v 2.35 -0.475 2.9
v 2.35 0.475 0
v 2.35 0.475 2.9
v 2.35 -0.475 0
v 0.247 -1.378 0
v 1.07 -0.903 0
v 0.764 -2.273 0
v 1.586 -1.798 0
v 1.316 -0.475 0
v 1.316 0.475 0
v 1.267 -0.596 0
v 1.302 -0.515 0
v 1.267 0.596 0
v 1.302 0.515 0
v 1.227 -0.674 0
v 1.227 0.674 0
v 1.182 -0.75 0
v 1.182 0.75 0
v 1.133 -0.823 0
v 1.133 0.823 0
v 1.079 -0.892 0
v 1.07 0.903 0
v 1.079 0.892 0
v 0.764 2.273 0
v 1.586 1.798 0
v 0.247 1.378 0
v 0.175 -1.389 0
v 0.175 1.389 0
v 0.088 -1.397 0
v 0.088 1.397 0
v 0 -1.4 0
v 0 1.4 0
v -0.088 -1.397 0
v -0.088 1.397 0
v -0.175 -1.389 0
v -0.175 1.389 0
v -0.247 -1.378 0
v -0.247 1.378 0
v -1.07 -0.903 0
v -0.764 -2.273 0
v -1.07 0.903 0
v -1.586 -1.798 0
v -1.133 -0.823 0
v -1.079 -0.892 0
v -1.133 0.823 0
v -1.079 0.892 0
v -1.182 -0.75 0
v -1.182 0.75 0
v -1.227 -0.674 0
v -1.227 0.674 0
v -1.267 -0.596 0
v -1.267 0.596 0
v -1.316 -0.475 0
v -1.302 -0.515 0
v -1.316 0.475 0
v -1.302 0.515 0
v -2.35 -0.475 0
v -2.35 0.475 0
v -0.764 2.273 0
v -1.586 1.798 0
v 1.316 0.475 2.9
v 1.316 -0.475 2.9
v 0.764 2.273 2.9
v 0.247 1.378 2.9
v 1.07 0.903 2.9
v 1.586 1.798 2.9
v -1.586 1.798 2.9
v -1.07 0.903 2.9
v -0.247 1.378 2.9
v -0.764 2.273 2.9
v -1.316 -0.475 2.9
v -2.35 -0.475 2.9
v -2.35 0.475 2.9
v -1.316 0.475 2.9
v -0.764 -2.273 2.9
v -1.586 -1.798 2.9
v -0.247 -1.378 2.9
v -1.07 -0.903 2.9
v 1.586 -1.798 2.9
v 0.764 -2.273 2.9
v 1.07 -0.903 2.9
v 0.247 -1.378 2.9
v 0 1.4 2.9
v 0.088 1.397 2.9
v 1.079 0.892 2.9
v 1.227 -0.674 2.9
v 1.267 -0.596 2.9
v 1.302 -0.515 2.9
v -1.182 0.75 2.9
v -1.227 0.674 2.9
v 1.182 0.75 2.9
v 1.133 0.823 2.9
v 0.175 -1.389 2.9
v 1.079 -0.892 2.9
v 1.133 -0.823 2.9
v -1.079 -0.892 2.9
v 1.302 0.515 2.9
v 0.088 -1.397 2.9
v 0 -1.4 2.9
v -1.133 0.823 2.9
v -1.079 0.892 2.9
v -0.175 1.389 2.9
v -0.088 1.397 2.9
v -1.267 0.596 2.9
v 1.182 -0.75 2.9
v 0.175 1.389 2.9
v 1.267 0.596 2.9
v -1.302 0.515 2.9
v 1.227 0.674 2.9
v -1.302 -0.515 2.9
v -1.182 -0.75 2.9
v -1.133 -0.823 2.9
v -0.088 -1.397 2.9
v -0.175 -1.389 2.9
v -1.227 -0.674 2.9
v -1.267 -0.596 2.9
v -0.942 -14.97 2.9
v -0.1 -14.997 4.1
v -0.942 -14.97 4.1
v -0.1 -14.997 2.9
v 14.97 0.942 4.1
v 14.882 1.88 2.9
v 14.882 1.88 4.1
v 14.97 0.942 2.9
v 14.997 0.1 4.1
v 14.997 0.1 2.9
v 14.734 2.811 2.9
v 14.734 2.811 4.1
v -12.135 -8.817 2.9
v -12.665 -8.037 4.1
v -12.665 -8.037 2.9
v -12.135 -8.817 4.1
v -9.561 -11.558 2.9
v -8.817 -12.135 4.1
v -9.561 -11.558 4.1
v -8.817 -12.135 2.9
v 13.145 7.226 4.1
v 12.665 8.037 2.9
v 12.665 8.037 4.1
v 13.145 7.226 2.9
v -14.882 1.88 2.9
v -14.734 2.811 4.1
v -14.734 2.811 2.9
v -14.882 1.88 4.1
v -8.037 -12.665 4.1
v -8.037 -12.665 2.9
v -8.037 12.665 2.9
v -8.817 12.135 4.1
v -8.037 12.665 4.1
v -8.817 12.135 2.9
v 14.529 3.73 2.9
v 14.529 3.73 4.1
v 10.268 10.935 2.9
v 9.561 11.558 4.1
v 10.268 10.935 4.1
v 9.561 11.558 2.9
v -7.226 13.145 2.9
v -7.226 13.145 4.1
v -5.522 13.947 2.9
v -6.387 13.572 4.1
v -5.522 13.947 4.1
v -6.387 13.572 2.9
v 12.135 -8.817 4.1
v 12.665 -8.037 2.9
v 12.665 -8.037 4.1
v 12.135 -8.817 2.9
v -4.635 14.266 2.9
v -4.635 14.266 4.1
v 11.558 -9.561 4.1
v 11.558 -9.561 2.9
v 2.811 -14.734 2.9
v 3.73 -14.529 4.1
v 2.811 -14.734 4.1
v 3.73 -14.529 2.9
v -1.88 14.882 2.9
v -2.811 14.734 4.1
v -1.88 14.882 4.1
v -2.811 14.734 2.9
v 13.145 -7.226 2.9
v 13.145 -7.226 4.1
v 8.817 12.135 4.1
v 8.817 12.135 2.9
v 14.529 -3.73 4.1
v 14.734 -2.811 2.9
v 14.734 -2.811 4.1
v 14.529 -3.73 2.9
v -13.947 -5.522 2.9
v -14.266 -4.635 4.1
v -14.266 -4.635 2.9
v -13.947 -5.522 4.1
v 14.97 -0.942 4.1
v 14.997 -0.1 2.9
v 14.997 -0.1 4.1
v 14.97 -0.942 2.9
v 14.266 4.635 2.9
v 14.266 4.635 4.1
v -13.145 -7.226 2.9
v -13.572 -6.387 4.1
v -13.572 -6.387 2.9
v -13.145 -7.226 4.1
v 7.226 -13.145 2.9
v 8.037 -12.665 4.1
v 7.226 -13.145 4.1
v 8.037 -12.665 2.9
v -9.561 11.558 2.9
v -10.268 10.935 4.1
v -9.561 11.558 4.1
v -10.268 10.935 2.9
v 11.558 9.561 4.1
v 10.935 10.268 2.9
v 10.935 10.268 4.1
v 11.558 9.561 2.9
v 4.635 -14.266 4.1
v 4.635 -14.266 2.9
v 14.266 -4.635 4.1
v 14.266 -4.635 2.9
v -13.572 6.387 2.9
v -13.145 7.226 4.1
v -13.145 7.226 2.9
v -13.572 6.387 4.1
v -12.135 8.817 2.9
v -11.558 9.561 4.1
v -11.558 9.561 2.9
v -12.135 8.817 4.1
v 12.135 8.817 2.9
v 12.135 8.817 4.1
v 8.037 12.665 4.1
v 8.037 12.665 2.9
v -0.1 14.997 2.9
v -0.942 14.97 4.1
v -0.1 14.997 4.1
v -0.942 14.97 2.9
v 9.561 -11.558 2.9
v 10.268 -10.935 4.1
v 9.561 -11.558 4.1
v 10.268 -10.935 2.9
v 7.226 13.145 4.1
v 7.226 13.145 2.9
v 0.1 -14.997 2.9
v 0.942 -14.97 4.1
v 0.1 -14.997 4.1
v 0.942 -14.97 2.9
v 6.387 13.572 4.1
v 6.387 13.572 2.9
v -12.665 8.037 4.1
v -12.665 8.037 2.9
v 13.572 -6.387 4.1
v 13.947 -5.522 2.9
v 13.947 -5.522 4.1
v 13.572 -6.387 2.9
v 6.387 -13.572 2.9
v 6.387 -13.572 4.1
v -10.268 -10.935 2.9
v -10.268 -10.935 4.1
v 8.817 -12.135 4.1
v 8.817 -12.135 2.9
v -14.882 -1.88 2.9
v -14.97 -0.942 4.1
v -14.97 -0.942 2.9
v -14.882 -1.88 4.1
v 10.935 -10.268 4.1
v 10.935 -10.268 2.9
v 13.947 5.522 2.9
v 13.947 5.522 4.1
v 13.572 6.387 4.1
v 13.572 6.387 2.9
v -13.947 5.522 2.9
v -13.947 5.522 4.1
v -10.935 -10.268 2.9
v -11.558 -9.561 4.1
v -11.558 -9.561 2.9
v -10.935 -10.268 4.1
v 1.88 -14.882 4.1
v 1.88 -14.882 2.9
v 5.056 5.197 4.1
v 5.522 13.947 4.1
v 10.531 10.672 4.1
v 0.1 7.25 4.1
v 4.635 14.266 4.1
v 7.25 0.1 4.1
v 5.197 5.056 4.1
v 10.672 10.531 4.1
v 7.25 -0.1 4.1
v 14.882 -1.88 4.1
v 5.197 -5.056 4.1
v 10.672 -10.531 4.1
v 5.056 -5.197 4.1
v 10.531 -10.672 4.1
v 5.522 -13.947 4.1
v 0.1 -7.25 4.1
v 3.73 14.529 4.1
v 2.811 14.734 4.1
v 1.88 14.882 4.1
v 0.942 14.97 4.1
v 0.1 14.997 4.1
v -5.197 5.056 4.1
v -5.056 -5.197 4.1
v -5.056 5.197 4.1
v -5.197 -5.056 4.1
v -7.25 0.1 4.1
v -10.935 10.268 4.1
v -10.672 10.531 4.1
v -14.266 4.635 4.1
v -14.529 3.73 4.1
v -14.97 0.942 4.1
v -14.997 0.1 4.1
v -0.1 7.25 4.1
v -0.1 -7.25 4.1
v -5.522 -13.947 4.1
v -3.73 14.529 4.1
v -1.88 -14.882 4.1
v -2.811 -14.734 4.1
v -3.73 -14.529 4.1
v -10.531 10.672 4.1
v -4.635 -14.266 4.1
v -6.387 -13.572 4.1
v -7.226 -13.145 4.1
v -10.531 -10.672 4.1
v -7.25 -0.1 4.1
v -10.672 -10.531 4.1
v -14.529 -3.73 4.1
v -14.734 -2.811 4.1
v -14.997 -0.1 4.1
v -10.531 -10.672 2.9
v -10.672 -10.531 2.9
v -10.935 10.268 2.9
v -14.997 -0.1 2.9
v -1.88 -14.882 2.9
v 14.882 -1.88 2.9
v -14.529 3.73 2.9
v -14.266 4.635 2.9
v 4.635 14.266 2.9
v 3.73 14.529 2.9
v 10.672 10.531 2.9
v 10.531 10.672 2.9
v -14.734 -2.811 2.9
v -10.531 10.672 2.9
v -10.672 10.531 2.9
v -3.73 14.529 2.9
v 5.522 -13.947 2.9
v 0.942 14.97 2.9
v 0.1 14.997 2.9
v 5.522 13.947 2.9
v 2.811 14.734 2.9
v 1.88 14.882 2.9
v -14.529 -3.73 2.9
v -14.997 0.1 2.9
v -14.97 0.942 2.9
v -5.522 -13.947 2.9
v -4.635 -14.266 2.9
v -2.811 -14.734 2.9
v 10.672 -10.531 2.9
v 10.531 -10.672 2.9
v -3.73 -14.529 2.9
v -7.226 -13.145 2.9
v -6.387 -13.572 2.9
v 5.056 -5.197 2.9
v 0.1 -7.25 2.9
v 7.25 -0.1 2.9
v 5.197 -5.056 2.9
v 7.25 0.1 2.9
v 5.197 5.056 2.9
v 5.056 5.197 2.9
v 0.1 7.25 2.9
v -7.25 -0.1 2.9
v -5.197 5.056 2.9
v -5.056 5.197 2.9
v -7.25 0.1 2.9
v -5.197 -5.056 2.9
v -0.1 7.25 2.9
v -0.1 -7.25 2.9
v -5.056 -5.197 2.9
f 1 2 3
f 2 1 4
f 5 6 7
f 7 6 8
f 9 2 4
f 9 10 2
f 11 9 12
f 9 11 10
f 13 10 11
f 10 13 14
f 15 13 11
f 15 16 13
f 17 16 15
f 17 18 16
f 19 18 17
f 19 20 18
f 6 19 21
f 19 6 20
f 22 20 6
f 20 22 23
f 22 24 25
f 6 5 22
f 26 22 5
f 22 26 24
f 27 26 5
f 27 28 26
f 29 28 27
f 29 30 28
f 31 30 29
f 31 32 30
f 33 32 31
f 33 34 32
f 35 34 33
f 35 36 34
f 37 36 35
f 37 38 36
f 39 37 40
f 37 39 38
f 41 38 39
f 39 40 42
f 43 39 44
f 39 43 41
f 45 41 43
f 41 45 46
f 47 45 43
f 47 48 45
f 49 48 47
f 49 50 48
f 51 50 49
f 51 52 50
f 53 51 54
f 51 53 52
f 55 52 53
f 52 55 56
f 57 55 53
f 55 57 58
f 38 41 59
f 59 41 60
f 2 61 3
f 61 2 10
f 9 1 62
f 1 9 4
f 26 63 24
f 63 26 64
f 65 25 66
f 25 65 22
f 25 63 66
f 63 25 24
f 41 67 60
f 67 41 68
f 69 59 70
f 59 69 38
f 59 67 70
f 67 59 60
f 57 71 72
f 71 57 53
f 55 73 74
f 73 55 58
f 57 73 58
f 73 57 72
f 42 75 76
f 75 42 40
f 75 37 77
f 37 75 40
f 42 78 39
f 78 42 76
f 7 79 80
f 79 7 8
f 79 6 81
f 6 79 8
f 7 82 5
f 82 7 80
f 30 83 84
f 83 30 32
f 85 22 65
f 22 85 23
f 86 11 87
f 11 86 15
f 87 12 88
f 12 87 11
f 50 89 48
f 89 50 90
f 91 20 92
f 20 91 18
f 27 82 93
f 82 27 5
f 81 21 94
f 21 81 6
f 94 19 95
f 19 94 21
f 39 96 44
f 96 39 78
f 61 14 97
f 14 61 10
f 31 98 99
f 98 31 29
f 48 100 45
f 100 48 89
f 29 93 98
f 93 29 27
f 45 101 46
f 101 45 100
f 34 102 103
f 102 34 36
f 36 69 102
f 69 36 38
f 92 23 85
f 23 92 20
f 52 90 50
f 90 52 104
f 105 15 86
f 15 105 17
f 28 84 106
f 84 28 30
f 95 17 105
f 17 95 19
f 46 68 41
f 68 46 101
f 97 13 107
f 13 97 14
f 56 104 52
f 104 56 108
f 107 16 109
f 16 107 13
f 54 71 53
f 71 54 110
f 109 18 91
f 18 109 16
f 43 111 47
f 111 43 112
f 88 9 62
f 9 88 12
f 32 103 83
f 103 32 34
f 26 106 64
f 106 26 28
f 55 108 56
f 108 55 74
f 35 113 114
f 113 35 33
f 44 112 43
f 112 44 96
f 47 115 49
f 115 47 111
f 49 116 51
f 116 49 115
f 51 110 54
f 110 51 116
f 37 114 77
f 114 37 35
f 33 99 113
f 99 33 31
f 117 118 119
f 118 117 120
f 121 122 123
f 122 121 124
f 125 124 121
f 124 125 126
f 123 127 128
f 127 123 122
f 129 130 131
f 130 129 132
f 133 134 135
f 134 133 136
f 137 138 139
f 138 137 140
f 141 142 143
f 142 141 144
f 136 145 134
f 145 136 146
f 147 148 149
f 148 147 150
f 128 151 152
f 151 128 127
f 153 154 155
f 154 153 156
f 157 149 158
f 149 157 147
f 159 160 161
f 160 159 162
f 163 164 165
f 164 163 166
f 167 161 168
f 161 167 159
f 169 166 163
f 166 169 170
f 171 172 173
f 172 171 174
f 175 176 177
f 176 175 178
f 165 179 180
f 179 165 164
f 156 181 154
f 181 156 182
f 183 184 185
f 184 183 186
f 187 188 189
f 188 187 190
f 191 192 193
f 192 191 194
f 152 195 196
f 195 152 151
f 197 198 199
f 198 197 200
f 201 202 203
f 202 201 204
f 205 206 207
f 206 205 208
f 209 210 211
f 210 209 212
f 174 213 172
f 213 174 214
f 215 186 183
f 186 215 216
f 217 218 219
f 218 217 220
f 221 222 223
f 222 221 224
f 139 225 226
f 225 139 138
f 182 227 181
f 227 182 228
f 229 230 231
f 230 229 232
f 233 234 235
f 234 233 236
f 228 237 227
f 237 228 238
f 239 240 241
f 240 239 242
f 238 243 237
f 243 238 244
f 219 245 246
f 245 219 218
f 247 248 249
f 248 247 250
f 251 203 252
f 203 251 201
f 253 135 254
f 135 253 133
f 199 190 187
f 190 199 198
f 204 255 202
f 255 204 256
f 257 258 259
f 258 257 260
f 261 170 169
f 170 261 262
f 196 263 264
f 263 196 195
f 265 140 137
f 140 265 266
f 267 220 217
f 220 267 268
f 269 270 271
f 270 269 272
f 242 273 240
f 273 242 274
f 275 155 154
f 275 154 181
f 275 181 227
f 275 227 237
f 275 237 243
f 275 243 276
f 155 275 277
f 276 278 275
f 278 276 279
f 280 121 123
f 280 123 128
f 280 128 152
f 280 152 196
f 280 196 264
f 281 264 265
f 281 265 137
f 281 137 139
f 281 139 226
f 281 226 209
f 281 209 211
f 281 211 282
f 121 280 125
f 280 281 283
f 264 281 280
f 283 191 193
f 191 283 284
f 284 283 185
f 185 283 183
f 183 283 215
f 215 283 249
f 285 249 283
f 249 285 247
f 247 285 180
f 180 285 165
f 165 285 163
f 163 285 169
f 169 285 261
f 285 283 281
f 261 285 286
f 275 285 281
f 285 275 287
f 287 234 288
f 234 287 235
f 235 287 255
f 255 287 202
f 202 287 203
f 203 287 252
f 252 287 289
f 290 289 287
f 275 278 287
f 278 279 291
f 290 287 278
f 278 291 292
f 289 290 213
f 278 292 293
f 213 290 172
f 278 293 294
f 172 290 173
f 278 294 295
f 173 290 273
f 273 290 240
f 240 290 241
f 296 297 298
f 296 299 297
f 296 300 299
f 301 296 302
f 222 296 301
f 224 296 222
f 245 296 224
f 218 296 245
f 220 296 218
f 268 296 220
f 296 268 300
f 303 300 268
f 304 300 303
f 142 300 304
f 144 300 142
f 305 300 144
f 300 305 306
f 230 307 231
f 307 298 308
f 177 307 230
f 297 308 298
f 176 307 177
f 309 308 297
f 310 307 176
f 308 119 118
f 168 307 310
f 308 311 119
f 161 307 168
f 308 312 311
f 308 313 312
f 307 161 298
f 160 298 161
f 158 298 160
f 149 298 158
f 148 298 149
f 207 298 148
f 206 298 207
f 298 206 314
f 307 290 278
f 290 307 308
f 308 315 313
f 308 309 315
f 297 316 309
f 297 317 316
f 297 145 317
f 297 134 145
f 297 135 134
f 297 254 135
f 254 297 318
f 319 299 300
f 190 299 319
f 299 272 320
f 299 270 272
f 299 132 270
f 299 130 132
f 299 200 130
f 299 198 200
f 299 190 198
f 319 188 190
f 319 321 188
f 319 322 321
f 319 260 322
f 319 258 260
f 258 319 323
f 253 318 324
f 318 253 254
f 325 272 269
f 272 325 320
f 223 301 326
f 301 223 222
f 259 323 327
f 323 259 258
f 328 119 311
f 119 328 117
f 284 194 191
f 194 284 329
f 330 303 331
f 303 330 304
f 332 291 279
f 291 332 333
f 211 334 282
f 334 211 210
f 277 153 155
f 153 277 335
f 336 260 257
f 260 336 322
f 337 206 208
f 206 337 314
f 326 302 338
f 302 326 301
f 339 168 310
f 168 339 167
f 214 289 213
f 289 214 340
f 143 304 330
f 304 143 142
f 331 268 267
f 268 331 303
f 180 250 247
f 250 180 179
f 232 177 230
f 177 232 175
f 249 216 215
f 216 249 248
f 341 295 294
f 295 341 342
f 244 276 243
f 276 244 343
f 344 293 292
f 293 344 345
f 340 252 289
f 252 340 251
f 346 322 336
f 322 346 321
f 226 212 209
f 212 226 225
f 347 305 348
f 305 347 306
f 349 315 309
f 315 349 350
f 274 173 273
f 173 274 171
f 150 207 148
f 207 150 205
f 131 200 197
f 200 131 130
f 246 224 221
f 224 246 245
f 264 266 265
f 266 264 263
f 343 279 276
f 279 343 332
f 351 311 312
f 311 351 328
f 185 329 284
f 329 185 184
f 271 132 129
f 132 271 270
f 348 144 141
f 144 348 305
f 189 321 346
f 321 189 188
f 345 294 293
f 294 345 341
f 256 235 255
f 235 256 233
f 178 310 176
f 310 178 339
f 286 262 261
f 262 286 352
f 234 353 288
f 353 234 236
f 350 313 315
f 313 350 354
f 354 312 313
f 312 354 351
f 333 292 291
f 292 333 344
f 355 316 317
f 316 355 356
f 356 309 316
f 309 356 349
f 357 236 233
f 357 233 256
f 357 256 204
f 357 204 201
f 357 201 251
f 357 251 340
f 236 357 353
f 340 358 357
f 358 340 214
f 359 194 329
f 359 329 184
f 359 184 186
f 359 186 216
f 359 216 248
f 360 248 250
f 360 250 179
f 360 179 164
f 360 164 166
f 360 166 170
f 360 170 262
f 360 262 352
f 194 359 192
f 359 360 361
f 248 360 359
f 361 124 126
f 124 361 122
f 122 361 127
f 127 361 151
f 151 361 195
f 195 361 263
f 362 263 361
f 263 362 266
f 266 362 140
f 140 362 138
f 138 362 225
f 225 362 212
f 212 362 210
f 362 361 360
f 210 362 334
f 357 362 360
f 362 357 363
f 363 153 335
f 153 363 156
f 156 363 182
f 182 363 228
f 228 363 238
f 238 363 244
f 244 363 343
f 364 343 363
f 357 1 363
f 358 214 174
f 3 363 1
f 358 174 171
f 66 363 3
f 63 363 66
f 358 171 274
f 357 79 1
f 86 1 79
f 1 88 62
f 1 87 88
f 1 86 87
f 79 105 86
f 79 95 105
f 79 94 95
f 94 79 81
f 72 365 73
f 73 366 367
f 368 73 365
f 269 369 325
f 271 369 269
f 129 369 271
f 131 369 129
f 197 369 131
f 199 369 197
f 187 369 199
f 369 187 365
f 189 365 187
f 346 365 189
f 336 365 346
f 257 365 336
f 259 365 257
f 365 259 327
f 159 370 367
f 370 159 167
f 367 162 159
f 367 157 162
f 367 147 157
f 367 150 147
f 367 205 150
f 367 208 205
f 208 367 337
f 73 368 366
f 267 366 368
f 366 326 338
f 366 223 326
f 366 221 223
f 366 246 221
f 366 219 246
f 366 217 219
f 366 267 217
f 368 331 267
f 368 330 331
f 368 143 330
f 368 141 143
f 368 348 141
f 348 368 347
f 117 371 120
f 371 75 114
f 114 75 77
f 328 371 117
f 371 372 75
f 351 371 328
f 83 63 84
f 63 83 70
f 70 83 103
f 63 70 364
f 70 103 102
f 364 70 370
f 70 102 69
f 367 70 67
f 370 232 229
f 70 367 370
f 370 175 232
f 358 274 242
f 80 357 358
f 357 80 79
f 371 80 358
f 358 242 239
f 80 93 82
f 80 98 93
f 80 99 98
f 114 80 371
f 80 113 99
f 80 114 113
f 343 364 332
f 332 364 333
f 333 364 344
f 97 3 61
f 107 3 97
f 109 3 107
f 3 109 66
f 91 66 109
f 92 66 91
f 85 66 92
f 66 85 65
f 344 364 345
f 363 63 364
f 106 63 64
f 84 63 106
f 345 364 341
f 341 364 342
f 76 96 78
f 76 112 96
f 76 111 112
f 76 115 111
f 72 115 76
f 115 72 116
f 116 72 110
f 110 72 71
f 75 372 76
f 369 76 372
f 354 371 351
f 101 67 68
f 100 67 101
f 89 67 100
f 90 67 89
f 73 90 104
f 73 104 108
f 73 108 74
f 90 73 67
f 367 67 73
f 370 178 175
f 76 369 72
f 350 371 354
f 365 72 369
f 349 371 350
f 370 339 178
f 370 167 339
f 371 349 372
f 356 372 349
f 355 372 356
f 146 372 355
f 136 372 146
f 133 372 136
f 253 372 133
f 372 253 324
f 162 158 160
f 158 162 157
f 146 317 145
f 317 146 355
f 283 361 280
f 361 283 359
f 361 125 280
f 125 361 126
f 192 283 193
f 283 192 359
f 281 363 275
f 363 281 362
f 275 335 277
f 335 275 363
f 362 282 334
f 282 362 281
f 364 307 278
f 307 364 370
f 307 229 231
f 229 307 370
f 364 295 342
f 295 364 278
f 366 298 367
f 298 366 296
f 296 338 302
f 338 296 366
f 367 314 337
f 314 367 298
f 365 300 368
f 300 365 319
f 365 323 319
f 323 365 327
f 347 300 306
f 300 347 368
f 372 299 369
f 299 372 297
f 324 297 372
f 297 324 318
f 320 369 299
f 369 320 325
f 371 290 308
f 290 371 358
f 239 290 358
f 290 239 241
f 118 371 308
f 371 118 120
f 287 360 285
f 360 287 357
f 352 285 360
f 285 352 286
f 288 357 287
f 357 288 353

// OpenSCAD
$fn=100;
cr=1.4;     // core radius
ir=2.3;      // inside radius
it=2;        // inside thickness
or=15;    // outside radius
tw=5.8;     // tape width
ww=1.2;       // wall width

cw = tw+ww;
tr=ir+it;

module top(){
difference(){
union(){
cylinder(r=tr,h=cw,center=true);

translate([0,0,-(tw+ww)/2])
cylinder(r=or,h=ww,center=true);
}

cylinder(r=cr,h=cw+2,center=true);

for (i = [0 : 5])
rotate([0,0,360 * i / 6])
translate([cr,0,0])
cube([(ir-cr)*2+0.3,1.1,cw+2],center=true);
}
}

module bottom(){
difference(){
union(){
translate([0,0,(tw+ww)/2])
cylinder(r=or,h=ww,center=true);

translate([0,0,cw/4]){
cylinder(r=cr,h=cw/2,center=true);

for (i = [0 : 5])
rotate([0,0,360 * i / 6])
translate([cr,0,0])
cube([(ir-cr)*2+0.1,0.95,cw/2],center=true);
}
}

xr=tr+3;
for (i = [0 : 7])
rotate([0,0,360 * i / 8])
translate([xr+(or-xr)/2,0,(tw+ww)/2])
cube([(or-xr)+0.1,0.2,ww+1],center=true);
}
}

//top();
bottom();
